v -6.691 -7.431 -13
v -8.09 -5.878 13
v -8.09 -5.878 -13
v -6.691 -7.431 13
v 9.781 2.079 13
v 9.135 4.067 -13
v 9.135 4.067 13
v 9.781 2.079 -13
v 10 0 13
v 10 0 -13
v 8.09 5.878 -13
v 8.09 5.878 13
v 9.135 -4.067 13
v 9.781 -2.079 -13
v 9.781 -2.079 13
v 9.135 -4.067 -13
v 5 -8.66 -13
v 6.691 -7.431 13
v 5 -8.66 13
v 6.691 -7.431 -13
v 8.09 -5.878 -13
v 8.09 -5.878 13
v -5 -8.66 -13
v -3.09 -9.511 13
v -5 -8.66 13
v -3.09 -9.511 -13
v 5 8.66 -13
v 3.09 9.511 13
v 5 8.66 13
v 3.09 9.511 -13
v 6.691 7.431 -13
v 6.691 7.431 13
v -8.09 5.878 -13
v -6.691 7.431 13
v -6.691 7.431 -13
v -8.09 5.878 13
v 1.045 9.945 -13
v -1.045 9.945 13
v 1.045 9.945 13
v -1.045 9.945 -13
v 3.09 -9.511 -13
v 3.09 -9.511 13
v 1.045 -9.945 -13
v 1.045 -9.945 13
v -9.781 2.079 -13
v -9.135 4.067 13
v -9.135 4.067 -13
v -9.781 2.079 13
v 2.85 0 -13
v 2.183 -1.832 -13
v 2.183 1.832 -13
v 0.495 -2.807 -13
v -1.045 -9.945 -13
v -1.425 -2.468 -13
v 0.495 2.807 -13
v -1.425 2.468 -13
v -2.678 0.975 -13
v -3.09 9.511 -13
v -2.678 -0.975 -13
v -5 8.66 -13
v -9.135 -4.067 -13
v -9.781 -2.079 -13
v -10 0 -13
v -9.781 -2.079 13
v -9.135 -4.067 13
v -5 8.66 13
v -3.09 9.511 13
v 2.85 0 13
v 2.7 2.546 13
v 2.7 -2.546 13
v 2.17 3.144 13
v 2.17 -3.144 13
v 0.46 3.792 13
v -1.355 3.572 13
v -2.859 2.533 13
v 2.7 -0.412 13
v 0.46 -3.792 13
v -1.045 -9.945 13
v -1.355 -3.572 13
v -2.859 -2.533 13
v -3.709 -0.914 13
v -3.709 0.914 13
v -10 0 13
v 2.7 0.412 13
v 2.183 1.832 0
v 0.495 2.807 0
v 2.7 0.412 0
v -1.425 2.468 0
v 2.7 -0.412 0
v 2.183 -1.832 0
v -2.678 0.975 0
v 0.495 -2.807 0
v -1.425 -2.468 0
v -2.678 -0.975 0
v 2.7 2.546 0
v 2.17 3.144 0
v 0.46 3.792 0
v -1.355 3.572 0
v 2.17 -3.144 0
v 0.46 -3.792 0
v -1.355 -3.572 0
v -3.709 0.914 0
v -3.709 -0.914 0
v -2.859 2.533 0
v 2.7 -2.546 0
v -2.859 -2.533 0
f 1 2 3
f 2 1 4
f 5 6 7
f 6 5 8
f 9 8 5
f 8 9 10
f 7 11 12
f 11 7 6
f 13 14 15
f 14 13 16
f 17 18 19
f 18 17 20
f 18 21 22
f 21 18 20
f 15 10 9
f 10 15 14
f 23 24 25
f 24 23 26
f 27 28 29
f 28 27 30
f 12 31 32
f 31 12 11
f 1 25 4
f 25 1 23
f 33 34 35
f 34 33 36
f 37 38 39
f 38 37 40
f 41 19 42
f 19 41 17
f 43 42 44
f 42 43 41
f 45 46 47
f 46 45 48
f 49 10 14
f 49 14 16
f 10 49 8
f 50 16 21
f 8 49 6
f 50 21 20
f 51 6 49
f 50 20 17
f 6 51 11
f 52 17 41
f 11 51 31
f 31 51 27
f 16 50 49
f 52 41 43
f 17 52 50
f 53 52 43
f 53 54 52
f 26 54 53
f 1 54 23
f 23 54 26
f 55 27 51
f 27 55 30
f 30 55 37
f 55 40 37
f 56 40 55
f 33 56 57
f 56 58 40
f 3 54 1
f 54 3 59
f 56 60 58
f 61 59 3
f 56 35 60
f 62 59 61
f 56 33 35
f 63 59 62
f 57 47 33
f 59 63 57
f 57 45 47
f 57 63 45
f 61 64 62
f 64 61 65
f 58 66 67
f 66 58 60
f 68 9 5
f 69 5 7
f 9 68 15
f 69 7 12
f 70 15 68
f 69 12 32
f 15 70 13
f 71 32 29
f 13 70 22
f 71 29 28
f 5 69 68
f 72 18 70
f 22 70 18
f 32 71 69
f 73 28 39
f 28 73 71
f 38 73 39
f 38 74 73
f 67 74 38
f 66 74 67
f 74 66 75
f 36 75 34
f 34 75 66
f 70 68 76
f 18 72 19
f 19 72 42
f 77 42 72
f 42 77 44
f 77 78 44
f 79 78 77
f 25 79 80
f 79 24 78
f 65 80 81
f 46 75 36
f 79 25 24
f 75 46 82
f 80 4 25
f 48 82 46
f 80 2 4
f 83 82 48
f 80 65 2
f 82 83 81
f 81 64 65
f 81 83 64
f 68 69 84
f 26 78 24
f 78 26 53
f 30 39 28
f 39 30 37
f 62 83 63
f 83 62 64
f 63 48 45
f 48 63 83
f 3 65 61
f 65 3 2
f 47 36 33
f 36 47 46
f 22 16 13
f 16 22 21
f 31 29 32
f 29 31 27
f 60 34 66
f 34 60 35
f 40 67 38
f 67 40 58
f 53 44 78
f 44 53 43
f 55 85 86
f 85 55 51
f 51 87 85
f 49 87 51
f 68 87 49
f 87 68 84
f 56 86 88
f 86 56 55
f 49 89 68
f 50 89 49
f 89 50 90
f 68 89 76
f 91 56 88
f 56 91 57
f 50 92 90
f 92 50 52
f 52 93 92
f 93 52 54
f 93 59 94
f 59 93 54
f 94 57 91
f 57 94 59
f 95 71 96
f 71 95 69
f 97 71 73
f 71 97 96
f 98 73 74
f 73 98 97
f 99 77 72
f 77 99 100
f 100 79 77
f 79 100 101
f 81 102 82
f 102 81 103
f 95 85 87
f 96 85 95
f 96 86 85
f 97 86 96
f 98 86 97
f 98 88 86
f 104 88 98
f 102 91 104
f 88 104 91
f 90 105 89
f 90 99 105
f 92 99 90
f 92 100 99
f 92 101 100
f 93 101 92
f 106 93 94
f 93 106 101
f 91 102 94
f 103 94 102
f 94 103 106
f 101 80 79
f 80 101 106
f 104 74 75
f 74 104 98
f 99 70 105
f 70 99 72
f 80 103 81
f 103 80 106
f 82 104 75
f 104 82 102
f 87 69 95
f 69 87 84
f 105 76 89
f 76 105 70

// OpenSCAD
module cycy()
{
    difference()
    {
        cylinder(h = 26, r = 10, center = true);
        cylinder(h = 35, r = 2.85, center = true);
    }
}
module arbreeeeee()
{
    difference()
    {
        cylinder(h = 50, r = 3.82);

        translate(v = [ 2.7, -10, -0.1 ]) cube(size = 16);
    }
}
difference()
{
    cycy();
    arbreeeeee();
}
